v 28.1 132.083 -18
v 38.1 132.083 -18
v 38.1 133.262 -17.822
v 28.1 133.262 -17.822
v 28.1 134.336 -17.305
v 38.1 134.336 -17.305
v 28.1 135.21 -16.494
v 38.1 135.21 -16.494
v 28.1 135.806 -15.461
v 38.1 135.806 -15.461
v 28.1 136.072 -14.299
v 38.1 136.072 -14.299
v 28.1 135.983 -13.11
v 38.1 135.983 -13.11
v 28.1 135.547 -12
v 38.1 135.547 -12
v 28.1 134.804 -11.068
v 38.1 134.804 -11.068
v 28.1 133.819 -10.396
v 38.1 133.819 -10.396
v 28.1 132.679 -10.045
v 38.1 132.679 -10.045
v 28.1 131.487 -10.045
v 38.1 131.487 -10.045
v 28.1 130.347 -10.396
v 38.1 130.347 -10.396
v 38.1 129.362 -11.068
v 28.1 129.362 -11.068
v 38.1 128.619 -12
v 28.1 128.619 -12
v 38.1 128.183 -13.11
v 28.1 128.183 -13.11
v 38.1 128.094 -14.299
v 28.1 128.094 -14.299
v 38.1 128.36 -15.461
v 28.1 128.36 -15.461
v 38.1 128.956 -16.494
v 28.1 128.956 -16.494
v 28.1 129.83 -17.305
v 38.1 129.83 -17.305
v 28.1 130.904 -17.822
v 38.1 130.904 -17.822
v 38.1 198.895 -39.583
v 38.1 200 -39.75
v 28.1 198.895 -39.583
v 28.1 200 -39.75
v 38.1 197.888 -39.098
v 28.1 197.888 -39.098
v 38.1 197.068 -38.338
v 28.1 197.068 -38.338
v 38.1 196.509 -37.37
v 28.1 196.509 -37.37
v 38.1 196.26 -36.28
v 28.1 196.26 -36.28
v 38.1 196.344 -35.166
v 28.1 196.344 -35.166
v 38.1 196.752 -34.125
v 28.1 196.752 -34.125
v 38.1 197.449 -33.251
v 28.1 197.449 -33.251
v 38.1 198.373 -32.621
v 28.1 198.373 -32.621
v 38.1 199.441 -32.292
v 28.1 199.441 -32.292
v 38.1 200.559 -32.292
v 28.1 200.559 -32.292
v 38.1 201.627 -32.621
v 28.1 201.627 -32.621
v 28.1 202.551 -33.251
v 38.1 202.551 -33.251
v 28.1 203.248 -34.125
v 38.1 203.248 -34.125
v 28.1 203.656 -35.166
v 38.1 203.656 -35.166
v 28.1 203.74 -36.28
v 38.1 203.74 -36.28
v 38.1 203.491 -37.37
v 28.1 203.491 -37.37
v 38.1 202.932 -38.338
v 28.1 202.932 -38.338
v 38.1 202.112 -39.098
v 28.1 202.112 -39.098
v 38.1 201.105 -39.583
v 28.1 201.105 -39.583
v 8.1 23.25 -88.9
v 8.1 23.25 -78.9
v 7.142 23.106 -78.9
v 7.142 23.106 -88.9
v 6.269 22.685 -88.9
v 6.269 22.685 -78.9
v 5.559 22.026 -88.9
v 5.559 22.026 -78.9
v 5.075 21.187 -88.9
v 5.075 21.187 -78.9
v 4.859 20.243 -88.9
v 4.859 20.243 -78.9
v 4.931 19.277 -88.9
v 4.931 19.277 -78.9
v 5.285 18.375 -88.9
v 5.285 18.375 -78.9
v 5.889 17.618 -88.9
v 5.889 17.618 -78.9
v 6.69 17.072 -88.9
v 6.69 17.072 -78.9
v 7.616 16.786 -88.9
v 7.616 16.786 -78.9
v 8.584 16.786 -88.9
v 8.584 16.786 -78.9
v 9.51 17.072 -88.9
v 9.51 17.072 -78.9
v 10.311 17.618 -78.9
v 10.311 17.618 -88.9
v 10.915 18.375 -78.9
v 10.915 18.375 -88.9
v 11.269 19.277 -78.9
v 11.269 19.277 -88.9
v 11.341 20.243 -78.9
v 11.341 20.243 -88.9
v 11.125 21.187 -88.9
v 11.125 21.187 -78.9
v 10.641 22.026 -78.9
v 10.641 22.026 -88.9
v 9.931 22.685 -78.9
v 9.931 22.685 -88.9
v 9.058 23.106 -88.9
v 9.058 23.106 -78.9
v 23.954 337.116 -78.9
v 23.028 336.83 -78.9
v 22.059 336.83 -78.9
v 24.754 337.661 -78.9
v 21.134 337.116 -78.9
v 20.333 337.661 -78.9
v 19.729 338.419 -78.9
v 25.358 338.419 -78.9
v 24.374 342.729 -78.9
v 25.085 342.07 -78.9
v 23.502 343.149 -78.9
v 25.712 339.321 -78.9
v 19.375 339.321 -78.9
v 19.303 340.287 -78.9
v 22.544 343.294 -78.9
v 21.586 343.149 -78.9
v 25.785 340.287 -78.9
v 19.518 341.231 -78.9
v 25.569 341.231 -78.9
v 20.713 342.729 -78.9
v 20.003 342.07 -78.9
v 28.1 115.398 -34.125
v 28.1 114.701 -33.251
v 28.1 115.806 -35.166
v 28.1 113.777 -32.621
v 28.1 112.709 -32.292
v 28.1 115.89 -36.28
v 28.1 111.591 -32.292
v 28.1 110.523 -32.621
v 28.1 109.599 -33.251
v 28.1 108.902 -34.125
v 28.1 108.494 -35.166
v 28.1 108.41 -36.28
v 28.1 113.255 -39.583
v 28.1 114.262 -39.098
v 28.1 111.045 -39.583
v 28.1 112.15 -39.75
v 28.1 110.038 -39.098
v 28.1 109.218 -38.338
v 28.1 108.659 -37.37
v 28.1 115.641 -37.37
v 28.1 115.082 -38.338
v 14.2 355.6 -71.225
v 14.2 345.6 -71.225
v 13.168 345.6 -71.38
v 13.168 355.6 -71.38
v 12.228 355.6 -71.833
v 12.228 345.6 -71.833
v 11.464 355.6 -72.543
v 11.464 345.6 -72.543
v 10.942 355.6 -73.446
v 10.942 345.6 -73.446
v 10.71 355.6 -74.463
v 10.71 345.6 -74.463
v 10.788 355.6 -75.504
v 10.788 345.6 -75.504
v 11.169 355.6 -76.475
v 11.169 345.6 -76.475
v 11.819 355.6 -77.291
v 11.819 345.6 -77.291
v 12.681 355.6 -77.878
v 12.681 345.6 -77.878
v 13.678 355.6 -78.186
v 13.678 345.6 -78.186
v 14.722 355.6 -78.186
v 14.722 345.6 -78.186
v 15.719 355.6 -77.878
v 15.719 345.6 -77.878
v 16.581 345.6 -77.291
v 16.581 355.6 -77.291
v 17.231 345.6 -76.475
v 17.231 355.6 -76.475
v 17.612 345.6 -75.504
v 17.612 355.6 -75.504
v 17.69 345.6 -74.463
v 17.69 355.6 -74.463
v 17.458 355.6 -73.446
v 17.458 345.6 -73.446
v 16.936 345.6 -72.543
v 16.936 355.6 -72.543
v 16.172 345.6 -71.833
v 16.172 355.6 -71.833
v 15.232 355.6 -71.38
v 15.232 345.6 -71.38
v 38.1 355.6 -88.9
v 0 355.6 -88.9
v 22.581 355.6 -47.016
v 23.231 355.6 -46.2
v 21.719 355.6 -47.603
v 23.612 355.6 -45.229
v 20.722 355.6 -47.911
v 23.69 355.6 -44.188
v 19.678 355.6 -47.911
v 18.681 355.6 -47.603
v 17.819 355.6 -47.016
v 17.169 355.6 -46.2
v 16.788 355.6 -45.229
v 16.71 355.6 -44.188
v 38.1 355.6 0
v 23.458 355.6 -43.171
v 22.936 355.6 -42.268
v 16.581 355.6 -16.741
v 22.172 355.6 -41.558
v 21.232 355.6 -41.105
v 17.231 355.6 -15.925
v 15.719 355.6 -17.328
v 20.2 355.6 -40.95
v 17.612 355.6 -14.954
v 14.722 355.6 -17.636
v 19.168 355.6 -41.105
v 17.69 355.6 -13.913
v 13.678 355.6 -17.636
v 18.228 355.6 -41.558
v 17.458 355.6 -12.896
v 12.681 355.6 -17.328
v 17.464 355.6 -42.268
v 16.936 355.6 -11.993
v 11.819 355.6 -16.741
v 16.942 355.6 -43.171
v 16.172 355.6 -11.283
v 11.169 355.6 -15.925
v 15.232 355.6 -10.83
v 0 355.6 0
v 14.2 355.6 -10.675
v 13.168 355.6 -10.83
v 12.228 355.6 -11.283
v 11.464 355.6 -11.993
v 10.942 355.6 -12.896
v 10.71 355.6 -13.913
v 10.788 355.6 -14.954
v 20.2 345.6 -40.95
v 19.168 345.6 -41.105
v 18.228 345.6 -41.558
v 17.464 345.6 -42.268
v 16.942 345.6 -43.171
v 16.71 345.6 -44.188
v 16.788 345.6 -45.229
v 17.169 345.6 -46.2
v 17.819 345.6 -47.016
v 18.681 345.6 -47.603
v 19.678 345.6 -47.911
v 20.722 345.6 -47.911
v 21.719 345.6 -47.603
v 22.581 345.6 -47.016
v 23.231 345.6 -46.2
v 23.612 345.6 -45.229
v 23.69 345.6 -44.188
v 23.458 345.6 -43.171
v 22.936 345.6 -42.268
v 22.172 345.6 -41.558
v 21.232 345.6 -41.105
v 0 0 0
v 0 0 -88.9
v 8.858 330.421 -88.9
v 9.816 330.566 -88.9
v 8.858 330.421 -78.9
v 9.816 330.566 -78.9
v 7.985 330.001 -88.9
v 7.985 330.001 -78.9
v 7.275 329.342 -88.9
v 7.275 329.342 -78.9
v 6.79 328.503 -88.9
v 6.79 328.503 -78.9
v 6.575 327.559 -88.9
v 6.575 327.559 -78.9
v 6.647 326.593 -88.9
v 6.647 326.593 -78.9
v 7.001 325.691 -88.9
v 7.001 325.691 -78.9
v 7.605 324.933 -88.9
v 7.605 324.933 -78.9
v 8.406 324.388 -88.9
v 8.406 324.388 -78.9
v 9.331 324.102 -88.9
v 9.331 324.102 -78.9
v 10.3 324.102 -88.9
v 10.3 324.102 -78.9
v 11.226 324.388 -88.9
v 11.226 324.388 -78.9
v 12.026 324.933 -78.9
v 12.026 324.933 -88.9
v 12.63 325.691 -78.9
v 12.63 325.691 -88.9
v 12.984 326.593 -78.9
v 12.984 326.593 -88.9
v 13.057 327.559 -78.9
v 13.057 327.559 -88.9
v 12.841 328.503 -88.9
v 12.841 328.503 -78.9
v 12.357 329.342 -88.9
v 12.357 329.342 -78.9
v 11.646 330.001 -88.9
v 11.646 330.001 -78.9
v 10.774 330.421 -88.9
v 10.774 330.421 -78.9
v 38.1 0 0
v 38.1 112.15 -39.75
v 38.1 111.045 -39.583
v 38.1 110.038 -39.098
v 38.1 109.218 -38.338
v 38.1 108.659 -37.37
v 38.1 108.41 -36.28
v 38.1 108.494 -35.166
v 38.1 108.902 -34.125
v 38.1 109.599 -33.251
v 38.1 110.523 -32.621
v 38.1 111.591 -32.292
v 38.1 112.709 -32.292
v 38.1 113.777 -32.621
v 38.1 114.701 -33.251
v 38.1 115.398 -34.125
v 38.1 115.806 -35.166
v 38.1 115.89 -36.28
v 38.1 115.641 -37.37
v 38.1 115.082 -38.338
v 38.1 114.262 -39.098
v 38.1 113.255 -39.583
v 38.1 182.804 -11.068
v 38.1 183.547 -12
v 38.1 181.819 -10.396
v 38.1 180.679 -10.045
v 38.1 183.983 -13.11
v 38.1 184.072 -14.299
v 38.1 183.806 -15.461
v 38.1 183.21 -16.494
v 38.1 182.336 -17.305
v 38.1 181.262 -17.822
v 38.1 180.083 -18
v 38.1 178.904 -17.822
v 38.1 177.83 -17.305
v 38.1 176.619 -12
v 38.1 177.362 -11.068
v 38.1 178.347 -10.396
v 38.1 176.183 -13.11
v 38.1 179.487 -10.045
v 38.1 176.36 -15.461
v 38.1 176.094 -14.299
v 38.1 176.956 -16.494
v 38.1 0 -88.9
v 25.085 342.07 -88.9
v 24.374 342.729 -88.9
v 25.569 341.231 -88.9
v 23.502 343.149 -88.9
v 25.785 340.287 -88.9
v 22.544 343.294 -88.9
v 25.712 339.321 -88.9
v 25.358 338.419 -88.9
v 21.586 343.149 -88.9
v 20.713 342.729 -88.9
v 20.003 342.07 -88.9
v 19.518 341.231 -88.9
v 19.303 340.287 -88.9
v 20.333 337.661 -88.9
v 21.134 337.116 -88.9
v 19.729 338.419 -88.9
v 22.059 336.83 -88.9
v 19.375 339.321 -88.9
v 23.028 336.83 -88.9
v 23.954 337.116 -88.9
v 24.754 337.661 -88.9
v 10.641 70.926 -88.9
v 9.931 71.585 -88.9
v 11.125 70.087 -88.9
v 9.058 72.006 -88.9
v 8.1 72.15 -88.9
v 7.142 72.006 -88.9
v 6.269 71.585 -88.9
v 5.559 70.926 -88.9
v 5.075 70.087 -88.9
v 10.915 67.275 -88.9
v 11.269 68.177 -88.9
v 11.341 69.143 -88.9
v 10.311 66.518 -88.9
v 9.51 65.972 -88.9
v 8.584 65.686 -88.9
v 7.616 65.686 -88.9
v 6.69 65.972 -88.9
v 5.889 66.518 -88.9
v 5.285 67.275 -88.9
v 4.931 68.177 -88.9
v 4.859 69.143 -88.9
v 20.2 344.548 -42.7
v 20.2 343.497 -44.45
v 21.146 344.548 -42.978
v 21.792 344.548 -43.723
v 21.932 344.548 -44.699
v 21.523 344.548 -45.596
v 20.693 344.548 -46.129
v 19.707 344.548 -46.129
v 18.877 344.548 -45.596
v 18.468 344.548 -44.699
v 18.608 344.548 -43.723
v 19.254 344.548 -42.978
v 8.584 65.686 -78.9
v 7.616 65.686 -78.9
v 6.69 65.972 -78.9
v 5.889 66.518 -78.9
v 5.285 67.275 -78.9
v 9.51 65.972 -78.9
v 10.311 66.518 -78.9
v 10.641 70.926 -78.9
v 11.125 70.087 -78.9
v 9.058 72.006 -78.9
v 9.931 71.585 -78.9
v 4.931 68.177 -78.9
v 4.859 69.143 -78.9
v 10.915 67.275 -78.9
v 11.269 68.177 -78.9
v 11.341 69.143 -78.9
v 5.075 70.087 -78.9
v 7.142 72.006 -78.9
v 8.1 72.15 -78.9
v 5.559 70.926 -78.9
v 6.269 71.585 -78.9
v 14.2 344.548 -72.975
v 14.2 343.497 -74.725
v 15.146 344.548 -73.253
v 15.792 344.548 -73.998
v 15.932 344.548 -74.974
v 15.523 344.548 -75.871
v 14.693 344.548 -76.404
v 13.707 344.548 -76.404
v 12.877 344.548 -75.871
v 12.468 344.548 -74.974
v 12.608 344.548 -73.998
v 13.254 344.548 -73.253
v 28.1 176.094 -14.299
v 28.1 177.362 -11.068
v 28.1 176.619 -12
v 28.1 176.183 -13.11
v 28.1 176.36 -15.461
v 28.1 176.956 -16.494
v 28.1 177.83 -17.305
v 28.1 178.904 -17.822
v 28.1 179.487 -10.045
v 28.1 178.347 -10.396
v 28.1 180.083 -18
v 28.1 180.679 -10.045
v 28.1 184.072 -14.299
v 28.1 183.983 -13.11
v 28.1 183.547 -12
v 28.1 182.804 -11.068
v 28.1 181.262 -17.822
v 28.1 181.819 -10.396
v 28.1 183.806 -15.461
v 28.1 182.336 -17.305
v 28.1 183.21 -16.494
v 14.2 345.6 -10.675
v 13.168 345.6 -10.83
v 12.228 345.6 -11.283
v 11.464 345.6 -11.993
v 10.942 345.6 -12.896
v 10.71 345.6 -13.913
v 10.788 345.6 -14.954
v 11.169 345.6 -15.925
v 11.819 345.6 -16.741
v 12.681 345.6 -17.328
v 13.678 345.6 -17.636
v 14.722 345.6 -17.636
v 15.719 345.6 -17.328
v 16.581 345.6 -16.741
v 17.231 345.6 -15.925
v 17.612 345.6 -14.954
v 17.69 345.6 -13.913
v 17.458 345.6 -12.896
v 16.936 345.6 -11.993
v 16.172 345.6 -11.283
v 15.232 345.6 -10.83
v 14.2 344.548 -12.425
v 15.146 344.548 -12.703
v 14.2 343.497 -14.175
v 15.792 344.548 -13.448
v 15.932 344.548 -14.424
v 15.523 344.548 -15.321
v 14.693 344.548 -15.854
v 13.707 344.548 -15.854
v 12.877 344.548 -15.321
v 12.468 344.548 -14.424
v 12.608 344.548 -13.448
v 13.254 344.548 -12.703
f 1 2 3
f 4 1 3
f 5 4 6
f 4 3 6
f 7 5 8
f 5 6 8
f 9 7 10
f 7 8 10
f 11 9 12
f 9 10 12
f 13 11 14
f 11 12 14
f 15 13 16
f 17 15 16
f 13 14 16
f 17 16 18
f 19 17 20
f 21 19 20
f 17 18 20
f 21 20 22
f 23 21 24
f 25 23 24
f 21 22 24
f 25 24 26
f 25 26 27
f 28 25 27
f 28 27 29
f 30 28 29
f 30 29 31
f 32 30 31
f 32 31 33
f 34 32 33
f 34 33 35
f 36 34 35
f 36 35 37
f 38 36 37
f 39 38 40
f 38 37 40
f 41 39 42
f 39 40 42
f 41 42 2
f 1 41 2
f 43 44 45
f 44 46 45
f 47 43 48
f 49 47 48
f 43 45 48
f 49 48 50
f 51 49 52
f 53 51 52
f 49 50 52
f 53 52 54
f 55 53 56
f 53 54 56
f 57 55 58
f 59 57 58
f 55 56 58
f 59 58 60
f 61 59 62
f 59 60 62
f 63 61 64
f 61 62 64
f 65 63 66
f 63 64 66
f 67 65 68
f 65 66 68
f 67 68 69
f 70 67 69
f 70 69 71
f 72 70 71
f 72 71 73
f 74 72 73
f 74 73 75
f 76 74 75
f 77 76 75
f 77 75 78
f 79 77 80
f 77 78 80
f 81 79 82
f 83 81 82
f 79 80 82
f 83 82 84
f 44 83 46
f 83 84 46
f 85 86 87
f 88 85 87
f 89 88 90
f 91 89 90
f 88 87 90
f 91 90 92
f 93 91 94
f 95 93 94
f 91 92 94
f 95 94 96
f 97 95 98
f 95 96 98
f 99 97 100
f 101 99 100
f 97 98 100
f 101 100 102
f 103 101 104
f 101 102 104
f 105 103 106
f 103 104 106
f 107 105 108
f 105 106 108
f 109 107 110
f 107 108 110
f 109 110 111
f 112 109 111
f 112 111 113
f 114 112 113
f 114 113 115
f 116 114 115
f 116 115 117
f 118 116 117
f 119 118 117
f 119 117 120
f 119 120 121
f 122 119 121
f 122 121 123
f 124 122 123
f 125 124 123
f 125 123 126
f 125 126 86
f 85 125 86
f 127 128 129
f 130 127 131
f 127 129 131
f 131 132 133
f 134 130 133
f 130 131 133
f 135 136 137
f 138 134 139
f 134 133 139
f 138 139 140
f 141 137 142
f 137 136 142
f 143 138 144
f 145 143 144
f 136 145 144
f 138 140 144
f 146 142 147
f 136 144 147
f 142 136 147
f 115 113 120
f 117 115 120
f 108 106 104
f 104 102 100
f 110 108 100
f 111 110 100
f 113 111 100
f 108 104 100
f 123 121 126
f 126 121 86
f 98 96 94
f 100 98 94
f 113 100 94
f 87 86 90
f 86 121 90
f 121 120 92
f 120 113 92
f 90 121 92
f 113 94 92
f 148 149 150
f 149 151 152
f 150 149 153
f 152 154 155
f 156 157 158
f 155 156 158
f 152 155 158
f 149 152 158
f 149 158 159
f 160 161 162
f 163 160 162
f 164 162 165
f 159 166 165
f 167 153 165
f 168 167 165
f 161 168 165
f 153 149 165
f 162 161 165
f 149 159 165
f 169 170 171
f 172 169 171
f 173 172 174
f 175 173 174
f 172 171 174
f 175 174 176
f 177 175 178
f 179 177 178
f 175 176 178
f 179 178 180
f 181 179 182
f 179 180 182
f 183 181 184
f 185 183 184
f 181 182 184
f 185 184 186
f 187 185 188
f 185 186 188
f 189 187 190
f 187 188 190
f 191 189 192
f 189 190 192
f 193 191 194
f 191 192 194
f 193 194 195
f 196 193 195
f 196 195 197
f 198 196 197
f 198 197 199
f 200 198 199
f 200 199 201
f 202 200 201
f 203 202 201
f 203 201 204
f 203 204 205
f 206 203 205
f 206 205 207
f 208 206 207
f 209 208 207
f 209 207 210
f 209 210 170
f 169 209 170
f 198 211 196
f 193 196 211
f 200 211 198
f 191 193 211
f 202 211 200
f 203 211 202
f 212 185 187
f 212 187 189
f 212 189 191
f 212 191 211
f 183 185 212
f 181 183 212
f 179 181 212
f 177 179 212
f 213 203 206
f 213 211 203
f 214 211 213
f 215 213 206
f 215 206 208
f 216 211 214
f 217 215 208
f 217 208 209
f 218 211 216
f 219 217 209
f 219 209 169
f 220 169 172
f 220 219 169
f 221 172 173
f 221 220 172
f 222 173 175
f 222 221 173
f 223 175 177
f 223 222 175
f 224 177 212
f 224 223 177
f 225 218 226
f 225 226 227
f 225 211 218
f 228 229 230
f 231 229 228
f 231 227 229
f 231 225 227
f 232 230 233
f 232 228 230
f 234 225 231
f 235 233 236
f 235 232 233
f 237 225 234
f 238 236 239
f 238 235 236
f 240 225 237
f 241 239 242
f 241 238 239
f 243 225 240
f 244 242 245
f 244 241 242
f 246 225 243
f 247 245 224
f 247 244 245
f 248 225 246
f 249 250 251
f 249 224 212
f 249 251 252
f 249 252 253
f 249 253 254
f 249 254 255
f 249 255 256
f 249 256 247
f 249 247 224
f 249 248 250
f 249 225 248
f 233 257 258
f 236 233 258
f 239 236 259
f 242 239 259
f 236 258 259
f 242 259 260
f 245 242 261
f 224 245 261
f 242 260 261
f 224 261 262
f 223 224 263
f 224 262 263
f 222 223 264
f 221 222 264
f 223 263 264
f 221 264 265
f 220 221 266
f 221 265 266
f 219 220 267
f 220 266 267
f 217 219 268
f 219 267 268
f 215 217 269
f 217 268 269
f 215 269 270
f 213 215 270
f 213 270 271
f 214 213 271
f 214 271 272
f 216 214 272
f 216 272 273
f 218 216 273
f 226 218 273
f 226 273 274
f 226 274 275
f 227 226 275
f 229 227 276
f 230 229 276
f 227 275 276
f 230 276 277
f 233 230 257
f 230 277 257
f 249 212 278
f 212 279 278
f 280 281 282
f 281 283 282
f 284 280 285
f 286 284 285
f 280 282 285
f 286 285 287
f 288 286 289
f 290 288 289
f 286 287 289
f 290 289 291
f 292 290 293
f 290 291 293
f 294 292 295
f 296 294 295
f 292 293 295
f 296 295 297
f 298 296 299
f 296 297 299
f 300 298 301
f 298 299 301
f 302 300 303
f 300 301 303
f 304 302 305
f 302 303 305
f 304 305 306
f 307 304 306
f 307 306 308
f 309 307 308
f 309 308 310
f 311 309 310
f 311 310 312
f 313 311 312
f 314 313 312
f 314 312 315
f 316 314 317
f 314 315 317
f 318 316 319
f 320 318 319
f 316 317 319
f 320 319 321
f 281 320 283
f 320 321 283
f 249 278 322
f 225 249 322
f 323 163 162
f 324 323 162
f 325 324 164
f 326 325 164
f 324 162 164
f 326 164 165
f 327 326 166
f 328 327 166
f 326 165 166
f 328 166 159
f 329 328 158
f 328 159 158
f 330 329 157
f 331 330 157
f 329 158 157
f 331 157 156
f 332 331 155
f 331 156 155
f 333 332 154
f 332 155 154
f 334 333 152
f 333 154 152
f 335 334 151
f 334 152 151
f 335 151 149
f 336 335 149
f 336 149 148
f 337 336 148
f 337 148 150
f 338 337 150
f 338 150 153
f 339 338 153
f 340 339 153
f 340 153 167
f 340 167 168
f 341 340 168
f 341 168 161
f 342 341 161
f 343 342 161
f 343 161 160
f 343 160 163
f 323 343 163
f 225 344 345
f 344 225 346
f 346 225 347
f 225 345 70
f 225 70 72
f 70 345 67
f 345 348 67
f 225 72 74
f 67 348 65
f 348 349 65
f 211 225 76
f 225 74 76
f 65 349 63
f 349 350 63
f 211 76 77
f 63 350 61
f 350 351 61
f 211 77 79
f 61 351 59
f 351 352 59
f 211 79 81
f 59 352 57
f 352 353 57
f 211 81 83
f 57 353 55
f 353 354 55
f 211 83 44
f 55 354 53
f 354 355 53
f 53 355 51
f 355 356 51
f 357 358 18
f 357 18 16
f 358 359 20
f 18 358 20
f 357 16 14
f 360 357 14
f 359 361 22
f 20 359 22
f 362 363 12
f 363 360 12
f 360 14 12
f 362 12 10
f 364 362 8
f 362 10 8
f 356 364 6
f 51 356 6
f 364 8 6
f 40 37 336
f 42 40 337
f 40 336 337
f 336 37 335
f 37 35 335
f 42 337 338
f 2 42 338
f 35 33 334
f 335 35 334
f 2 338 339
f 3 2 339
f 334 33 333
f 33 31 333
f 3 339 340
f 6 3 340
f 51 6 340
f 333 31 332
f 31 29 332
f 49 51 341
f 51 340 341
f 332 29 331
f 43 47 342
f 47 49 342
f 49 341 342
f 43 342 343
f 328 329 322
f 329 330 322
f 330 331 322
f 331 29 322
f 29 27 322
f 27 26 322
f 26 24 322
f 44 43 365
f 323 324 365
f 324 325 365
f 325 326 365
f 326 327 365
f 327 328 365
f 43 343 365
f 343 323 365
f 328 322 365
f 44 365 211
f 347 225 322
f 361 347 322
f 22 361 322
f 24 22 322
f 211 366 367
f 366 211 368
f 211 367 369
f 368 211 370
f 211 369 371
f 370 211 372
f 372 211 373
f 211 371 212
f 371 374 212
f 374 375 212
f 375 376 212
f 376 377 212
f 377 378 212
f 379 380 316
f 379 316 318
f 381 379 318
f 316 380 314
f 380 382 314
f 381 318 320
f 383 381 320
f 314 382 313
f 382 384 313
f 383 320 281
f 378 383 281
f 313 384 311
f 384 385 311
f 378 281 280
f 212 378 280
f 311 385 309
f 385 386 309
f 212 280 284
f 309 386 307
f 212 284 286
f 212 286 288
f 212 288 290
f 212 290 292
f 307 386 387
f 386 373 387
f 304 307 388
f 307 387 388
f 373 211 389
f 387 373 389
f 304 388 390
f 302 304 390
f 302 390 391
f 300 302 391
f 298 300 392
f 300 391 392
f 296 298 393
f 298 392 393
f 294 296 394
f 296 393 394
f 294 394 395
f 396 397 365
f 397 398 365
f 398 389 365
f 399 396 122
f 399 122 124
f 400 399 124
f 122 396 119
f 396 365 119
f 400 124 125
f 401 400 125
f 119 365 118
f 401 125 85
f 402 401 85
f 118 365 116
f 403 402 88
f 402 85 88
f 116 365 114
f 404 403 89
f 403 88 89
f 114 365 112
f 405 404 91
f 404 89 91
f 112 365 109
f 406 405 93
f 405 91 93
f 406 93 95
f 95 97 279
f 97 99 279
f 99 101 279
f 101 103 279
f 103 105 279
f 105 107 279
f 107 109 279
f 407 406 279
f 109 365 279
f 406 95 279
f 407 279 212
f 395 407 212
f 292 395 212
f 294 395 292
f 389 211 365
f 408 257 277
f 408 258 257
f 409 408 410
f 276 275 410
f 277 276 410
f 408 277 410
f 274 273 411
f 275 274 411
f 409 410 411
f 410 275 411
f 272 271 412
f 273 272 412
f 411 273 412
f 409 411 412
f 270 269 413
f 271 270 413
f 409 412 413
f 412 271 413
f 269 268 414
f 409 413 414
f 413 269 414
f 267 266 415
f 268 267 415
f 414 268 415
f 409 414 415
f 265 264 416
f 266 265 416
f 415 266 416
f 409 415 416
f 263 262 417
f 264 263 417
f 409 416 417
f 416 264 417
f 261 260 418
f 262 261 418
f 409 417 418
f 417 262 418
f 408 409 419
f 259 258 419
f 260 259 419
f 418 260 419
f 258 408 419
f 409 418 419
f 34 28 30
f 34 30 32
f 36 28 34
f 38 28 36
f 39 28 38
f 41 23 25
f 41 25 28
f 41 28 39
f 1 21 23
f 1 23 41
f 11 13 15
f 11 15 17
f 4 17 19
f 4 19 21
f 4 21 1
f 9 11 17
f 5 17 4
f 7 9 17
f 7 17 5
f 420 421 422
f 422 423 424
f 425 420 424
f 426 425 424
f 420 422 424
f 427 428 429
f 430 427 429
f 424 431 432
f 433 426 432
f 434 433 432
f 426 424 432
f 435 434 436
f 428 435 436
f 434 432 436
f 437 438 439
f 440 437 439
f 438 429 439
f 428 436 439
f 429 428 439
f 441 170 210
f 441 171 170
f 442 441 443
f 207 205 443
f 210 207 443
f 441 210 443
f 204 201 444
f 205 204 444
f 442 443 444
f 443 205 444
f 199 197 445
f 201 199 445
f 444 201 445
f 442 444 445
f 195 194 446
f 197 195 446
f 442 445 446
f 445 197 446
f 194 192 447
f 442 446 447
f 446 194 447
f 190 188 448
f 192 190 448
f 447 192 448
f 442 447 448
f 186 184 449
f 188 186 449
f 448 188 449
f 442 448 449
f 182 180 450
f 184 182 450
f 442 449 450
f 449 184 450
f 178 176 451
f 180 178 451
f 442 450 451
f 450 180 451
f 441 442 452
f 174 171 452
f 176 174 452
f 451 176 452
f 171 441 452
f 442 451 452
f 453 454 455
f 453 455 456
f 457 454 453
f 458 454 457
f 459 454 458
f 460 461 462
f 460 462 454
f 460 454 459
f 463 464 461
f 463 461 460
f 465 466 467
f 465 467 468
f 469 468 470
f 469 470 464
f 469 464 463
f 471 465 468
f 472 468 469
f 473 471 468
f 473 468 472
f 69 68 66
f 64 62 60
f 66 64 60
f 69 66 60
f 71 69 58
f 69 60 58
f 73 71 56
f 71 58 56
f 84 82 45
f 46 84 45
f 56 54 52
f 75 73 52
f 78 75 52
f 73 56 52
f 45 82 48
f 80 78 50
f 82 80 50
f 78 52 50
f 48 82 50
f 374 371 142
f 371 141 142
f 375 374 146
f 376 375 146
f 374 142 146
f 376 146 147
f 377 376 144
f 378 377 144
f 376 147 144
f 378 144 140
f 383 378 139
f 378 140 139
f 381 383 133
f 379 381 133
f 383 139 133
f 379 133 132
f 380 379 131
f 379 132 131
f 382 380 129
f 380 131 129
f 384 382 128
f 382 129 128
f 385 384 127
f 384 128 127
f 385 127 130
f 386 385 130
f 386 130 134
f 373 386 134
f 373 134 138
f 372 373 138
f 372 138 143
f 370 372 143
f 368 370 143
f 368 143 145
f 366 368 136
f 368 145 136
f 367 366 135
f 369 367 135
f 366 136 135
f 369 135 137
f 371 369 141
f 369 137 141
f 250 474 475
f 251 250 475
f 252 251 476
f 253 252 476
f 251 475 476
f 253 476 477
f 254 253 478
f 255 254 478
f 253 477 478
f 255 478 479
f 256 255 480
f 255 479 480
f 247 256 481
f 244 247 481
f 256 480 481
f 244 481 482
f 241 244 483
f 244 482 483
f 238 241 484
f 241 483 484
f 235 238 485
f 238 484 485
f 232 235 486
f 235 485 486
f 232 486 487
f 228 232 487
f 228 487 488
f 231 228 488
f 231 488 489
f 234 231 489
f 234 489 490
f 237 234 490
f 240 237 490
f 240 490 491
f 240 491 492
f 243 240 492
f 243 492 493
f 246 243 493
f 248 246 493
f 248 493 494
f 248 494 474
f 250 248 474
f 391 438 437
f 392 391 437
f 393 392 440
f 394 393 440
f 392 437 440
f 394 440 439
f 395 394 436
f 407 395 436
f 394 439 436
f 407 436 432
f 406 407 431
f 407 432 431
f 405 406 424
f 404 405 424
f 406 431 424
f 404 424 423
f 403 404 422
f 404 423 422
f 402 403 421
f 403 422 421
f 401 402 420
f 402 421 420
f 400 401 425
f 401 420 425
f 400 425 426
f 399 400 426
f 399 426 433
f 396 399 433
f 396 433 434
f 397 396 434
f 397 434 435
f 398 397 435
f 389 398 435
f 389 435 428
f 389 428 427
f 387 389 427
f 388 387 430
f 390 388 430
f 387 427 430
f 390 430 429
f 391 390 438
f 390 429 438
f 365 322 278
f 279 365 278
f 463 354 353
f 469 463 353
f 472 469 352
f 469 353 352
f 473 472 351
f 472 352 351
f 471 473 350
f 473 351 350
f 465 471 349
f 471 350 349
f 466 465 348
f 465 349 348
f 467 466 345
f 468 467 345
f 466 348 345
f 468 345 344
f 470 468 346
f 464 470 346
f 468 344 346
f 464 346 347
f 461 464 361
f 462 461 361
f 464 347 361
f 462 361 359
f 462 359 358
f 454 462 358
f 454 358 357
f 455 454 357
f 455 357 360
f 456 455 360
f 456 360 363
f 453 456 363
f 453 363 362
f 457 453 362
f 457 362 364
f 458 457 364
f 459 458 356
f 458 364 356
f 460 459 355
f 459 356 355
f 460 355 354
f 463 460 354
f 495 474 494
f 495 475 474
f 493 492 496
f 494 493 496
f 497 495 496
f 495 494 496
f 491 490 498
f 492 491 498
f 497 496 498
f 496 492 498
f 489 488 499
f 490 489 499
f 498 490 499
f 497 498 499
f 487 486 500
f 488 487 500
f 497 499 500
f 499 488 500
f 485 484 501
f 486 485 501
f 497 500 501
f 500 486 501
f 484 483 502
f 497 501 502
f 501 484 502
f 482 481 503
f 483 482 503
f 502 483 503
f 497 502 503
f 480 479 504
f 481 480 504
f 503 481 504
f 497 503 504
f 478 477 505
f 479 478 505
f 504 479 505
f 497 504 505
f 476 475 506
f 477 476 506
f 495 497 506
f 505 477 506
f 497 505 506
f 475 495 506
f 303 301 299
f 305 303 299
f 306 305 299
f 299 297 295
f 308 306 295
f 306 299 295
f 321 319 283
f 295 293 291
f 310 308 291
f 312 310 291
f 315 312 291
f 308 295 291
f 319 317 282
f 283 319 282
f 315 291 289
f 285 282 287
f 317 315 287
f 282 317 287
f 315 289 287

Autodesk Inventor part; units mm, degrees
ref_plane "YZ Plane" through (0, 0, 0) normal (1, 0, 0) x (0, 1, 0)
ref_plane "XZ Plane" through (0, 0, 0) normal (0, 1, 0) x (-1, 0, 0)
ref_plane "XY Plane" through (0, 0, 0) normal (0, 0, 1) x (1, 0, 0)
sketch "Sketch1" plane through (0, 0, 0) normal (0, 1, 0) x (-1, 0, 0)
  line L0 (0, 0) -> (-38.1, 0)
  line L1 (-38.1, 0) -> (-38.1, -88.9)
  line L2 (-38.1, -88.9) -> (0, -88.9)
  line L3 (0, -88.9) -> (0, 0)
  dimension "d0" = 38.1
  dimension "d1" = 88.9
extrude "Extrusion1" add sketch "Sketch1" along normal blind 355.6
sketch "Sketch3" plane through (0, 355.6, 0) normal (0, 1, 0) x (1, 0, 0)
  line L0 (14.2, 74.725) -> (14.2, 14.175)
  line L1 (38.1, 88.9) -> (0, 88.9) projected
  line L2 (0, 0) -> (38.1, 0) projected
  line L3 (14.2, 44.45) -> (20.2, 44.45)
  line L4 (0, 88.9) -> (0, 0) projected
  dimension "d59" = 60.55
  dimension "d60" = 14.175
  dimension "d61" = 14.175
  dimension "d62" = 6
  dimension "d63" = 30.275
  dimension "d64" = 20.2
hole "Hole1" at (14.2, 355.6, -74.725) at (20.2, 355.6, -44.45) at (14.2, 355.6, -14.175) direction (0, -1, 0) diameter 7 depth 10 tip angle 118
sketch "Sketch5" plane through (38.1, 0, -88.9) normal (0, 0, -1) x (-1, 0, 0)
  line L0 (0, 355.6) -> (28.2843, 327.3157)
  line L1 (0, 355.6) -> (38.1, 355.6) projected
  circle A0 centre (28.2843, 327.3157) radius 2.35
  circle A1 centre (15.5563, 340.0437) radius 2.35
  point P0 (38.1, 0)
  dimension "d25" = 45
  dimension "d26" = 40
  dimension "d27" = 4.7
  dimension "d28" = 4.7
  dimension "d29" = 18
hole "Hole2" at (9.8157, 327.3157, -88.9) at (22.5437, 340.0437, -88.9) direction (0, 0, 1) diameter 6.5 depth 10
sketch "Sketch6" plane through (38.1, 0, -88.9) normal (0, 0, -1) x (-1, 0, 0)
  line L0 (0, 0) -> (0, 355.6) projected
  line L1 (0, 0) -> (30, 0)
  line L2 (30, 0) -> (30, 20)
  line L3 (30, 20) -> (0, 20)
  line L4 (0, 20) -> (0, 0)
  line L5 (30, 20) -> (30, 68.9)
  circle A0 centre (30, 20) radius 6.1957
  circle A1 centre (30, 68.9) radius 5.1366
  point P0 (38.1, 0)
  dimension "d37" = 30
  dimension "d38" = 20
  dimension "d39" = 48.9
hole "Hole3" at (8.1, 20, -88.9) at (8.1, 68.9, -88.9) direction (0, 0, 1) diameter 6.5 depth 10
sketch "Sketch7" plane through (38.1, 0, 0) normal (1, 0, 0) x (0, 0, -1)
  line L0 (0, 0) -> (36, 0)
  line L1 (36, 0) -> (36, 200)
  line L2 (36, 200) -> (0, 200)
  line L3 (0, 200) -> (0, 0)
  circle A0 centre (36, 200) radius 3.75
  circle A1 centre (36, 112.15) radius 3.75
  dimension "d47" = 36
  dimension "d48" = 200
  dimension "d49" = 87.85
  dimension "d50" = 7.5
  dimension "d51" = 7.5
  dimension "d65" = 112.15
hole "Hole4" at (38.1, 112.15, -36) at (38.1, 200, -36) direction (-1, 0, 0) diameter 7.5 depth 10
sketch "Sketch8" plane through (38.1, 0, 0) normal (1, 0, 0) x (0, 0, -1)
  line L0 (0, 0) -> (14, 0)
  line L1 (14, 0) -> (14, 156.083) construction
  line L2 (14, 156.083) -> (0, 156.083)
  line L3 (0, 156.083) -> (0, 0)
  line L4 (14, 156.083) -> (14, 132.083)
  line L5 (14, 156.083) -> (14, 180.083)
  circle A0 centre (14, 132.083) radius 4
  circle A1 centre (14, 180.083) radius 4
  dimension "d66" = 156.083
  dimension "d67" = 14
  dimension "d69" = 24
  dimension "d70" = 24
  dimension "d71" = 8
  dimension "d72" = 8
extrude "Extrusion2" cut sketch "Sketch8" against normal blind 10
properties part number "thigh2x4" material "Wood (Birch)"
